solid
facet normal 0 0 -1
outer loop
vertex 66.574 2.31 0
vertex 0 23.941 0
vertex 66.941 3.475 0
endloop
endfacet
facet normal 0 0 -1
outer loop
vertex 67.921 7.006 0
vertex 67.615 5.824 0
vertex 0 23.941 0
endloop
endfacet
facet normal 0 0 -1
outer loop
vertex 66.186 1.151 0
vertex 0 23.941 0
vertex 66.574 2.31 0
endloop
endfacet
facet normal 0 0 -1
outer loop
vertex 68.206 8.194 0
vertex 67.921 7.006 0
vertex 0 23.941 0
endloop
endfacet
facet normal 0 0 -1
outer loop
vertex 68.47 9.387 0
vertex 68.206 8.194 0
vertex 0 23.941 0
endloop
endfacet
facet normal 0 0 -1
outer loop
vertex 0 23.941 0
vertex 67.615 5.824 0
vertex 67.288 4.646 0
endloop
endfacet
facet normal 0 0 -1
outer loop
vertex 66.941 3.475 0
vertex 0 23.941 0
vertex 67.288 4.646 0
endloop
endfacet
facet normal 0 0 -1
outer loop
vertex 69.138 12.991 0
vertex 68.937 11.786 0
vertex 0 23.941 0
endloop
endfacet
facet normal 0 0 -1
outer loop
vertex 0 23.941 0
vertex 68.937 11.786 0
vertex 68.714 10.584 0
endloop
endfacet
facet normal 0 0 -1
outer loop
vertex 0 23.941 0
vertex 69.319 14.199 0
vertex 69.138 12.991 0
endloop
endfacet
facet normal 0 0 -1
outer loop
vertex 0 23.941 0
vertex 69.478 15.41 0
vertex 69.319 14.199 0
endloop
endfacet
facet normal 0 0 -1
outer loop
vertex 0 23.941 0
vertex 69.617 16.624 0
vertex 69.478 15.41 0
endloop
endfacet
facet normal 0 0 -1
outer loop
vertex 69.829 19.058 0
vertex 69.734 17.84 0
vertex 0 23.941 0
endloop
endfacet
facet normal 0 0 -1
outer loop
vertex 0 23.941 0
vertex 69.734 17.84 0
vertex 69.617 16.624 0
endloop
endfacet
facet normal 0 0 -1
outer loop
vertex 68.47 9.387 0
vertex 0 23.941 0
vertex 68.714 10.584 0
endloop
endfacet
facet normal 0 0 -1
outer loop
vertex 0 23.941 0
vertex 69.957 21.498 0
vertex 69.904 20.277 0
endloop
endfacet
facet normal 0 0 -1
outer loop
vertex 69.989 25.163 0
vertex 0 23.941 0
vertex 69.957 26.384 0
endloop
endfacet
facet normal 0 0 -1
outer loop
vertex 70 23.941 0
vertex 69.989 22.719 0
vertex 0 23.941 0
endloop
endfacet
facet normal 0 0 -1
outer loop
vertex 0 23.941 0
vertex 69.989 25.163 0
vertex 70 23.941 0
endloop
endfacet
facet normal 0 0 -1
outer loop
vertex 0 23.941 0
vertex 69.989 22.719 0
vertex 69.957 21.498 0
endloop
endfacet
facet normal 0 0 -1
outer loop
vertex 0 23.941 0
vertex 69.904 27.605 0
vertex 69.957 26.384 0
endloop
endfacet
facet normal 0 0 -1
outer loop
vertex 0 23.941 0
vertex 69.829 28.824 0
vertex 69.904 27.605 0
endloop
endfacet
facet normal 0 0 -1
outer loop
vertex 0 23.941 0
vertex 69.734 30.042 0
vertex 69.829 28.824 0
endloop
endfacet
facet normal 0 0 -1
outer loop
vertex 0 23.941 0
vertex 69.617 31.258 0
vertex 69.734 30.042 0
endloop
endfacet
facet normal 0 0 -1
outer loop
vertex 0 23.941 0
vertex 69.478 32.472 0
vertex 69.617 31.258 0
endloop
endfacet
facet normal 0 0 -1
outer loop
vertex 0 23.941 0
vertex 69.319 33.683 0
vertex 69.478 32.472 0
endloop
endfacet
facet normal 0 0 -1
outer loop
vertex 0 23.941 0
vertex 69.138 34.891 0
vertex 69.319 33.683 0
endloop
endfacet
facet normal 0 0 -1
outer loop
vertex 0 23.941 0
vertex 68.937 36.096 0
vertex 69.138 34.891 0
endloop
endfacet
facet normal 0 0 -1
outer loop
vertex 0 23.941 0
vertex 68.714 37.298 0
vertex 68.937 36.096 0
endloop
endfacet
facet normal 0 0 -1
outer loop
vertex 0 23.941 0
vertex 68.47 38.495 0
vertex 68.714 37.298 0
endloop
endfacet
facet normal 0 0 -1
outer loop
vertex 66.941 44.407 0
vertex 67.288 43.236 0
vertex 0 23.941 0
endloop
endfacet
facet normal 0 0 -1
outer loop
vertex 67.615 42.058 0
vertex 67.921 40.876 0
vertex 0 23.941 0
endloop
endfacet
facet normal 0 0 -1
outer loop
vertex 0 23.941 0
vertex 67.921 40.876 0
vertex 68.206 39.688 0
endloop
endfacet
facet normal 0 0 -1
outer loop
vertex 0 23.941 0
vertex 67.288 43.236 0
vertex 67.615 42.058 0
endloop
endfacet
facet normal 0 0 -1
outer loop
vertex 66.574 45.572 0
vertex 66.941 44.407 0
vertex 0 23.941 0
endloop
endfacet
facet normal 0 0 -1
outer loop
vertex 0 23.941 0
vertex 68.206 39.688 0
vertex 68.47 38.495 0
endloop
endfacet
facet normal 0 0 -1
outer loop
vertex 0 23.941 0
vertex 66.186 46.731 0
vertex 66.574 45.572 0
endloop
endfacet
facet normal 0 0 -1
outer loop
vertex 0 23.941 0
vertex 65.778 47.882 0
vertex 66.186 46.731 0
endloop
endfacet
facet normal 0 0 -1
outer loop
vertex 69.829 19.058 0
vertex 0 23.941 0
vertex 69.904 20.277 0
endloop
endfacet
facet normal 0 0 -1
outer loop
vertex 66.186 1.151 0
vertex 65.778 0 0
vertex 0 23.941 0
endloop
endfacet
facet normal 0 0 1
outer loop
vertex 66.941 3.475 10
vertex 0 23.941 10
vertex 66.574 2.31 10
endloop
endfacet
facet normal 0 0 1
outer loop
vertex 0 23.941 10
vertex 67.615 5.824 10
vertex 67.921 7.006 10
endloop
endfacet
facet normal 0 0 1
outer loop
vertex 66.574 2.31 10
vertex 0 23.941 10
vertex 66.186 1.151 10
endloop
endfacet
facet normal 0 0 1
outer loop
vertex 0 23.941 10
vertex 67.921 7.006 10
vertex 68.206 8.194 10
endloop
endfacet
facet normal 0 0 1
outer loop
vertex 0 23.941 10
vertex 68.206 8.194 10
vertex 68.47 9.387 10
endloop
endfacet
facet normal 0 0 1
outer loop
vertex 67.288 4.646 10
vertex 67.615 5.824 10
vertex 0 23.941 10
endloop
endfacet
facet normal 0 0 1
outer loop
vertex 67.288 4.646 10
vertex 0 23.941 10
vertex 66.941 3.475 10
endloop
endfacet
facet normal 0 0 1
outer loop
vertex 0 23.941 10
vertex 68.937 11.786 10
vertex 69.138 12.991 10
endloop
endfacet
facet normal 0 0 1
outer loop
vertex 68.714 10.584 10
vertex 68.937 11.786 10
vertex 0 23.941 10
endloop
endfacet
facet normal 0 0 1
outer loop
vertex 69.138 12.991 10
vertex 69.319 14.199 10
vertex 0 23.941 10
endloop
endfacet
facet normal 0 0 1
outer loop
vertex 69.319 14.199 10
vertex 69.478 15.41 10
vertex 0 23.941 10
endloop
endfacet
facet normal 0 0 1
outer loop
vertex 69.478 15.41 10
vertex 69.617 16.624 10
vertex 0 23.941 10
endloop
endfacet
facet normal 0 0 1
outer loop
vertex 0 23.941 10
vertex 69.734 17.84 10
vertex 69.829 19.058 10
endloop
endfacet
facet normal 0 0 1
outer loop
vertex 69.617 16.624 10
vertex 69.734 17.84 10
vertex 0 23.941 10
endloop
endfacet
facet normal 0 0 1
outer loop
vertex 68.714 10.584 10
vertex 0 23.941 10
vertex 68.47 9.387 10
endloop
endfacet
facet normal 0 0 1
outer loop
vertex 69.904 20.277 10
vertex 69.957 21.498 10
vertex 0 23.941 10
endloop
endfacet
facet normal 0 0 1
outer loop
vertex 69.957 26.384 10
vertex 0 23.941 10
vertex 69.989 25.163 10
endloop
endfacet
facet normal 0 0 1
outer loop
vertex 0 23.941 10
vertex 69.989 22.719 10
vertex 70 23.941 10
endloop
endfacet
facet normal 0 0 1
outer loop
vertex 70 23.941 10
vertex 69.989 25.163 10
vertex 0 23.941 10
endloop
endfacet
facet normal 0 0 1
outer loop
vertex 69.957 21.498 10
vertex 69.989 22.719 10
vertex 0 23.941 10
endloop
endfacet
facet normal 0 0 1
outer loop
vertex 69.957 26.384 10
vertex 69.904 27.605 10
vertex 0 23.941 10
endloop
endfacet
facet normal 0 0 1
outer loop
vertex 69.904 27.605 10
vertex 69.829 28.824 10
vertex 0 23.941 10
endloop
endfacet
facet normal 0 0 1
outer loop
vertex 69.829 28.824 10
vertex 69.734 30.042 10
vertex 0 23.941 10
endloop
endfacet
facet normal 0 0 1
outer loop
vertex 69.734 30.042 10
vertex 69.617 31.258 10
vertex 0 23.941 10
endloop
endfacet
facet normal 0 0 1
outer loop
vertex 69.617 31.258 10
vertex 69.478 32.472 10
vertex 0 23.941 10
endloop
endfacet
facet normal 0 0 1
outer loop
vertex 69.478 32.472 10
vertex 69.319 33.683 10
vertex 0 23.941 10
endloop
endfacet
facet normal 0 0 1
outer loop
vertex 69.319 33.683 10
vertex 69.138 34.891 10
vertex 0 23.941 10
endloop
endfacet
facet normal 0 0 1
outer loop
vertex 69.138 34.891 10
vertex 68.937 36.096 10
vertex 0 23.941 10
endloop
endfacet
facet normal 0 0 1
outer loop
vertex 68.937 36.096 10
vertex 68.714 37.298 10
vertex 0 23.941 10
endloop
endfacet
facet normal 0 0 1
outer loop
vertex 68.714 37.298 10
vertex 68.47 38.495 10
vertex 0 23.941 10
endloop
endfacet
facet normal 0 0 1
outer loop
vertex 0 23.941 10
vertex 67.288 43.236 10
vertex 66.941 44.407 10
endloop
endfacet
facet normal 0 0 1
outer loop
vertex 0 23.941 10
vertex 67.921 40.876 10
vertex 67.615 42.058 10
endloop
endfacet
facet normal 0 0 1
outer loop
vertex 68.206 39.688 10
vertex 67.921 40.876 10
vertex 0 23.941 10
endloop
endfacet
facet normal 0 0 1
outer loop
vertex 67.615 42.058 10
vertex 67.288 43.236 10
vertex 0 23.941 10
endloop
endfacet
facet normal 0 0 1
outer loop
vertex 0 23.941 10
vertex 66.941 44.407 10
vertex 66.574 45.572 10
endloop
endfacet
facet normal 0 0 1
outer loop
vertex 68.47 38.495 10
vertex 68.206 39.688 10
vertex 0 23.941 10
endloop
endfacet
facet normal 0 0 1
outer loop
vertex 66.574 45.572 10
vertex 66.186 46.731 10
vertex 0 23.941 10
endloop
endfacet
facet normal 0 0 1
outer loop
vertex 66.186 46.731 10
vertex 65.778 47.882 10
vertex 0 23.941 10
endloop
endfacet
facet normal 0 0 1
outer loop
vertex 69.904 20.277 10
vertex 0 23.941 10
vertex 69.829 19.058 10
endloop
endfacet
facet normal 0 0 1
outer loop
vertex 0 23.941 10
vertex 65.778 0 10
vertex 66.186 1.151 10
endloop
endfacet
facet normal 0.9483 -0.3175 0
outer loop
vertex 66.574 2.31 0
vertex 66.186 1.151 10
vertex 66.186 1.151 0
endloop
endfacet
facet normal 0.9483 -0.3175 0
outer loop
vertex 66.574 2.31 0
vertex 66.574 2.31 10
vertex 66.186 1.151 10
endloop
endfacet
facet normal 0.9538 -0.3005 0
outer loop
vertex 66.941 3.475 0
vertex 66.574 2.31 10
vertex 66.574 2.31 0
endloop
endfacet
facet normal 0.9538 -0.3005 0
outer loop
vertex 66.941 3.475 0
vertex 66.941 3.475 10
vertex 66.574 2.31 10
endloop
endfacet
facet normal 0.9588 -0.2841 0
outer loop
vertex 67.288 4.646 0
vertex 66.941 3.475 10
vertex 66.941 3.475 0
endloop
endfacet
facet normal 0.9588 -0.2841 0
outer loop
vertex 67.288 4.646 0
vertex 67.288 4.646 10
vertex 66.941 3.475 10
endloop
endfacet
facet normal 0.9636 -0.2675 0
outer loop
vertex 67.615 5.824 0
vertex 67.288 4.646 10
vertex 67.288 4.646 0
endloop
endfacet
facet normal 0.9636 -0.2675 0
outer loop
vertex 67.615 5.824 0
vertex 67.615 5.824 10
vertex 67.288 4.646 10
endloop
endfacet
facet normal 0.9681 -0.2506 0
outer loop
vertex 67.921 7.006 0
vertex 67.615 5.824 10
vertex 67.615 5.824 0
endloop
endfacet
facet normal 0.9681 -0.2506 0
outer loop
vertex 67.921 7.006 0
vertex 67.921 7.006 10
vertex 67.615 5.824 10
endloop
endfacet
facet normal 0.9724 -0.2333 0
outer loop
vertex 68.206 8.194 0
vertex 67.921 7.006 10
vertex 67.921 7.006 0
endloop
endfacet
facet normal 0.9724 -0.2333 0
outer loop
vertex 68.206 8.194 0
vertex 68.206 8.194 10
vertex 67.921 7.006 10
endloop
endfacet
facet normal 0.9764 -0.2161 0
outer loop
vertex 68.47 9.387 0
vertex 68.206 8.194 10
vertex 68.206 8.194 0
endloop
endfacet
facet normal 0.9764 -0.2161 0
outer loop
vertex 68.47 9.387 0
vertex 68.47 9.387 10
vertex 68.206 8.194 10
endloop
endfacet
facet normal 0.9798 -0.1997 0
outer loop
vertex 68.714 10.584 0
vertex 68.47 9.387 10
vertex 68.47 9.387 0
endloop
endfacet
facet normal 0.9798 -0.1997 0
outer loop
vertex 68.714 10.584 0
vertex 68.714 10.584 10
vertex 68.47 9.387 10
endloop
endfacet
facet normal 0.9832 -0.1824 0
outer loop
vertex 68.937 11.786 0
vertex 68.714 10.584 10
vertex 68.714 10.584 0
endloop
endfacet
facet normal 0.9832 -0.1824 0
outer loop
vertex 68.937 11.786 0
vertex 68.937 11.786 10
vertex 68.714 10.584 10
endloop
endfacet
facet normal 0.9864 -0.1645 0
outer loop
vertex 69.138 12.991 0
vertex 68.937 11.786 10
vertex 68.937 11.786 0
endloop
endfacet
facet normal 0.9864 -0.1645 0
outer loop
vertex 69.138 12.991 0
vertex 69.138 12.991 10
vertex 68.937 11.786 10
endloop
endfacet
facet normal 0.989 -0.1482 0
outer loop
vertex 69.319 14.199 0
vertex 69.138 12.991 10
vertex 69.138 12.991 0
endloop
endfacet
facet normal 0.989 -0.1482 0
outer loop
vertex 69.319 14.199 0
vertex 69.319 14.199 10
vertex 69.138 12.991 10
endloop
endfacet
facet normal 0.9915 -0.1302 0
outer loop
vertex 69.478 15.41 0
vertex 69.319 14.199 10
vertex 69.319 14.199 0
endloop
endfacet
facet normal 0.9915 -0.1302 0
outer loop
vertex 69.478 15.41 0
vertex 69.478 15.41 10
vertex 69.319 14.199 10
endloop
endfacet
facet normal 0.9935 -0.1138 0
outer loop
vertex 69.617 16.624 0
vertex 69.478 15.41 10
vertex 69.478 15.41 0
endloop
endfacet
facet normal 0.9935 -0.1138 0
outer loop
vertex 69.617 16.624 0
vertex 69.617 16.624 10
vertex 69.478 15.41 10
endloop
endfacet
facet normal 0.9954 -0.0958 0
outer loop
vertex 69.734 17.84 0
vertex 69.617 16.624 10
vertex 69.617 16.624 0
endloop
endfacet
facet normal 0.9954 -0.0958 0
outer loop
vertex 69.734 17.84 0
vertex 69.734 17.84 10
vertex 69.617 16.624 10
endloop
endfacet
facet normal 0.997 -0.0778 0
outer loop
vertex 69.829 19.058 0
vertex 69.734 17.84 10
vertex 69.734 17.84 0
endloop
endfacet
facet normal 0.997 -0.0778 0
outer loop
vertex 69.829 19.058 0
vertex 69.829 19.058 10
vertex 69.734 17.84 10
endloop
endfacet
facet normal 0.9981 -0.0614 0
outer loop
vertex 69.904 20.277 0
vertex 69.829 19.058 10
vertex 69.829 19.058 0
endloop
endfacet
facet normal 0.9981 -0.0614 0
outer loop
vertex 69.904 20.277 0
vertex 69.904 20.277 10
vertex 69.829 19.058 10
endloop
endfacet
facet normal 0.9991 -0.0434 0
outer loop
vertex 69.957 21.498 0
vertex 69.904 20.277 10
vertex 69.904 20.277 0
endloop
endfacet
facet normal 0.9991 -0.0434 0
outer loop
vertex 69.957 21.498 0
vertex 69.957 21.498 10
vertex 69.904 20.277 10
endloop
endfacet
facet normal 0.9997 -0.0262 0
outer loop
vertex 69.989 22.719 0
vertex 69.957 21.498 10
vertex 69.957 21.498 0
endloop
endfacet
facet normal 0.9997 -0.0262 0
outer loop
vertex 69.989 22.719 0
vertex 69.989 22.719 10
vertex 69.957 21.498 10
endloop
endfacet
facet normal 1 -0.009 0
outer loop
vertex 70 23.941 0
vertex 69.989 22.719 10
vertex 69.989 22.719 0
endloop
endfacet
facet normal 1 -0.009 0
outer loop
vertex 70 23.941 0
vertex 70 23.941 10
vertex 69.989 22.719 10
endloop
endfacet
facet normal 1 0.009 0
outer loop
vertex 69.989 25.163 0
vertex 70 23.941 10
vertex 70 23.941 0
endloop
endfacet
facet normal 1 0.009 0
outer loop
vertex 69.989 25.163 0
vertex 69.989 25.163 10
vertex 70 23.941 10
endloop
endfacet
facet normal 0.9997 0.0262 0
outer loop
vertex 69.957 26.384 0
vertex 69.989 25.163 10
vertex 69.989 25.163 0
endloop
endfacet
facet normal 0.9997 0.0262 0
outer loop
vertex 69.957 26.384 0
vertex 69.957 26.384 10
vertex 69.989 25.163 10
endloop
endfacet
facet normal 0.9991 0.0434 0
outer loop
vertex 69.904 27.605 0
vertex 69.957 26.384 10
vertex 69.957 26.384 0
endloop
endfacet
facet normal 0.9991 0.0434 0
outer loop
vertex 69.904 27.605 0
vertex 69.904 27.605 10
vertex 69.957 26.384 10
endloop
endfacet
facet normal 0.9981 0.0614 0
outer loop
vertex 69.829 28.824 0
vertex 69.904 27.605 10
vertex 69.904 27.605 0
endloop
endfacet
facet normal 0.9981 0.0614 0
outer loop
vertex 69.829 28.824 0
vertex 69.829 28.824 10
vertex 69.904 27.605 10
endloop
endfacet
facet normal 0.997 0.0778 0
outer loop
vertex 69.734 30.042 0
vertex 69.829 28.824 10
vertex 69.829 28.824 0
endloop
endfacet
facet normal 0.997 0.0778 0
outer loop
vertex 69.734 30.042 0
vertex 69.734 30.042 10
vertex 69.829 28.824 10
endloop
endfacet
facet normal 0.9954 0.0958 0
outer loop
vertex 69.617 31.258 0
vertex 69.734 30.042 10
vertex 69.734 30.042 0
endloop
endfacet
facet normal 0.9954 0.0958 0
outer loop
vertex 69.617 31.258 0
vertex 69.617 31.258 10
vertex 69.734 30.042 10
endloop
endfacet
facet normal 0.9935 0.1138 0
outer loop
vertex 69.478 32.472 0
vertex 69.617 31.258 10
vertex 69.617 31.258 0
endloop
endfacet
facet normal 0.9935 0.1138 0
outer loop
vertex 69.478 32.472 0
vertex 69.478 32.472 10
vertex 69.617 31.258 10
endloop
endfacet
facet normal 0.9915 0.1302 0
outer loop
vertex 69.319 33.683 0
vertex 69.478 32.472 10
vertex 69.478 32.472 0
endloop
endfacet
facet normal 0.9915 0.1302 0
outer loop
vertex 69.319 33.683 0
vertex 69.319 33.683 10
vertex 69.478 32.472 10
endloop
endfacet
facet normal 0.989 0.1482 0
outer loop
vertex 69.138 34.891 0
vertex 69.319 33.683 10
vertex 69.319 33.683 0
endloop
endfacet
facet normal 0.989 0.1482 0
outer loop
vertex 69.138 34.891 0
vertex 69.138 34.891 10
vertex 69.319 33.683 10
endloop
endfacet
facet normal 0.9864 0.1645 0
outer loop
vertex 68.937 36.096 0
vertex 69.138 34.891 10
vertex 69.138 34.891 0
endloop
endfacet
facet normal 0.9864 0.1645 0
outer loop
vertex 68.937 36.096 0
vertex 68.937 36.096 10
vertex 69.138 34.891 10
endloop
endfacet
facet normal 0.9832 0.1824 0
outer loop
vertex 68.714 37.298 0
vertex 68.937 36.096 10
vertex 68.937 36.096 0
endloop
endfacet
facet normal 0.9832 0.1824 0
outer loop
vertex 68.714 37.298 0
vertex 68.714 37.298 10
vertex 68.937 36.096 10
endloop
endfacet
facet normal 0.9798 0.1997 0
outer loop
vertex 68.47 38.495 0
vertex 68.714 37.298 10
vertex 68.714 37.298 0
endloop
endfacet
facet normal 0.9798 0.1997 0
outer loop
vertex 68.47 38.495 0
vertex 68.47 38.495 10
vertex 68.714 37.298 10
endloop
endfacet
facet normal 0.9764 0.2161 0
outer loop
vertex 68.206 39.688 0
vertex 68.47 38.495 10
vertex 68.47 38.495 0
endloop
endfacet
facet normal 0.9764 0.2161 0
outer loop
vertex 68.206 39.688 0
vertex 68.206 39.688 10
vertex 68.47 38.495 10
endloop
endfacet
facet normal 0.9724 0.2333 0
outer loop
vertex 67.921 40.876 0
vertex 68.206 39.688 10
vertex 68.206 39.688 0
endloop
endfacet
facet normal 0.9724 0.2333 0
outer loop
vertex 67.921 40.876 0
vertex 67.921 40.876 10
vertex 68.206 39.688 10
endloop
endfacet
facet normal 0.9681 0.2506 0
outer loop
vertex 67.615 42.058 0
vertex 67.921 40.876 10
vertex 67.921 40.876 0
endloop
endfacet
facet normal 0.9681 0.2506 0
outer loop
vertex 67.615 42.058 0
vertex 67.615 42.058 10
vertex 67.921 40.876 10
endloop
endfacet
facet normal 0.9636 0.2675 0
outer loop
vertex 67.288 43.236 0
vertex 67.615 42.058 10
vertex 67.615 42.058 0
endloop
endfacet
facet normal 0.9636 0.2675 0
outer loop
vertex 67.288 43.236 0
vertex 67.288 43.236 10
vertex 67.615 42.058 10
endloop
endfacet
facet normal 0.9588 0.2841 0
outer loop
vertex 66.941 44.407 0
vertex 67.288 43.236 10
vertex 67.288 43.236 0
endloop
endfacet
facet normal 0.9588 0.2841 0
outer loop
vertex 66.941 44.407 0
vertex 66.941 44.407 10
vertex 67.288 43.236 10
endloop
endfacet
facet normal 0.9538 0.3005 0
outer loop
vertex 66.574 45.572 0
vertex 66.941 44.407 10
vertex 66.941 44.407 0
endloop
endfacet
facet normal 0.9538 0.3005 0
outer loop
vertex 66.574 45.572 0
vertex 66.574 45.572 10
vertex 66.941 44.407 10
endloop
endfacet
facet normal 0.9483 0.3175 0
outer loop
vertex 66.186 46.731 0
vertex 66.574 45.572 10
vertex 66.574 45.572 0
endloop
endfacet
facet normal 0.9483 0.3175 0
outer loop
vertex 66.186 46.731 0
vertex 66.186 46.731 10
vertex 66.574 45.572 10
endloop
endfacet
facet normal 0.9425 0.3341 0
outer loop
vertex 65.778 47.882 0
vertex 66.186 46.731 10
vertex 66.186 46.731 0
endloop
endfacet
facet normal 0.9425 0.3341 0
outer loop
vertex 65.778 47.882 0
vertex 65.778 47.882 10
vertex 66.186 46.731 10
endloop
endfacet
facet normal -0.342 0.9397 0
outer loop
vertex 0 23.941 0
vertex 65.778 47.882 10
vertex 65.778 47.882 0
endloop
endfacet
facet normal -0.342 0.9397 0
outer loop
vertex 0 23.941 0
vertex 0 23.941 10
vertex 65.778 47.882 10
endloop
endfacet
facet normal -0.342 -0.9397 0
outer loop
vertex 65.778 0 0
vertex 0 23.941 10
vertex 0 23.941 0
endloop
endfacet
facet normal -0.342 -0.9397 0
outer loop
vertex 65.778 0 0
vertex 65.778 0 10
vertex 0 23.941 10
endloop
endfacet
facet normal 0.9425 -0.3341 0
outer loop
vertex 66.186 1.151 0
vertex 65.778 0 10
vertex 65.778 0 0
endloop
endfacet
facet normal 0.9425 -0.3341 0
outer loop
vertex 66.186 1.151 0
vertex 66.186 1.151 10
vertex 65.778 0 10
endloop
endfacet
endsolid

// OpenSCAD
$fn = 32;

// ----------------------------------------------------------------------
// Arc profile plate: sector, 42 points
// ----------------------------------------------------------------------

// --- parameters (mm) ---
sector_angle = 40;        // sector angle, degrees
sector_r = 70;            // outer radius
arc_step = 1;             // sampling step of the arc, degrees
plate_t = 10;             // plate thickness, Z

bbox_x = 2 * sector_r * sin(sector_angle / 2);  // chord of the sector
bbox_y = sector_r;  // depth of the sector (apex to arc)

profile = [[65.778, 0], [66.186, 1.151], [66.574, 2.31], [66.941, 3.475], [67.288, 4.646], [67.615, 5.824], [67.921, 7.006], [68.206, 8.194], [68.47, 9.387], [68.714, 10.584], [68.937, 11.786], [69.138, 12.991], [69.319, 14.199], [69.478, 15.41], [69.617, 16.624], [69.734, 17.84], [69.829, 19.058], [69.904, 20.277], [69.957, 21.498], [69.989, 22.719], [70, 23.941], [69.989, 25.163], [69.957, 26.384], [69.904, 27.605], [69.829, 28.824], [69.734, 30.042], [69.617, 31.258], [69.478, 32.472], [69.319, 33.683], [69.138, 34.891], [68.937, 36.096], [68.714, 37.298], [68.47, 38.495], [68.206, 39.688], [67.921, 40.876], [67.615, 42.058], [67.288, 43.236], [66.941, 44.407], [66.574, 45.572], [66.186, 46.731], [65.778, 47.882], [0, 23.941]];  // primary outline, 42 points, counter clockwise

// --- the one profile operation ---
linear_extrude(height = plate_t) polygon(points = profile);
